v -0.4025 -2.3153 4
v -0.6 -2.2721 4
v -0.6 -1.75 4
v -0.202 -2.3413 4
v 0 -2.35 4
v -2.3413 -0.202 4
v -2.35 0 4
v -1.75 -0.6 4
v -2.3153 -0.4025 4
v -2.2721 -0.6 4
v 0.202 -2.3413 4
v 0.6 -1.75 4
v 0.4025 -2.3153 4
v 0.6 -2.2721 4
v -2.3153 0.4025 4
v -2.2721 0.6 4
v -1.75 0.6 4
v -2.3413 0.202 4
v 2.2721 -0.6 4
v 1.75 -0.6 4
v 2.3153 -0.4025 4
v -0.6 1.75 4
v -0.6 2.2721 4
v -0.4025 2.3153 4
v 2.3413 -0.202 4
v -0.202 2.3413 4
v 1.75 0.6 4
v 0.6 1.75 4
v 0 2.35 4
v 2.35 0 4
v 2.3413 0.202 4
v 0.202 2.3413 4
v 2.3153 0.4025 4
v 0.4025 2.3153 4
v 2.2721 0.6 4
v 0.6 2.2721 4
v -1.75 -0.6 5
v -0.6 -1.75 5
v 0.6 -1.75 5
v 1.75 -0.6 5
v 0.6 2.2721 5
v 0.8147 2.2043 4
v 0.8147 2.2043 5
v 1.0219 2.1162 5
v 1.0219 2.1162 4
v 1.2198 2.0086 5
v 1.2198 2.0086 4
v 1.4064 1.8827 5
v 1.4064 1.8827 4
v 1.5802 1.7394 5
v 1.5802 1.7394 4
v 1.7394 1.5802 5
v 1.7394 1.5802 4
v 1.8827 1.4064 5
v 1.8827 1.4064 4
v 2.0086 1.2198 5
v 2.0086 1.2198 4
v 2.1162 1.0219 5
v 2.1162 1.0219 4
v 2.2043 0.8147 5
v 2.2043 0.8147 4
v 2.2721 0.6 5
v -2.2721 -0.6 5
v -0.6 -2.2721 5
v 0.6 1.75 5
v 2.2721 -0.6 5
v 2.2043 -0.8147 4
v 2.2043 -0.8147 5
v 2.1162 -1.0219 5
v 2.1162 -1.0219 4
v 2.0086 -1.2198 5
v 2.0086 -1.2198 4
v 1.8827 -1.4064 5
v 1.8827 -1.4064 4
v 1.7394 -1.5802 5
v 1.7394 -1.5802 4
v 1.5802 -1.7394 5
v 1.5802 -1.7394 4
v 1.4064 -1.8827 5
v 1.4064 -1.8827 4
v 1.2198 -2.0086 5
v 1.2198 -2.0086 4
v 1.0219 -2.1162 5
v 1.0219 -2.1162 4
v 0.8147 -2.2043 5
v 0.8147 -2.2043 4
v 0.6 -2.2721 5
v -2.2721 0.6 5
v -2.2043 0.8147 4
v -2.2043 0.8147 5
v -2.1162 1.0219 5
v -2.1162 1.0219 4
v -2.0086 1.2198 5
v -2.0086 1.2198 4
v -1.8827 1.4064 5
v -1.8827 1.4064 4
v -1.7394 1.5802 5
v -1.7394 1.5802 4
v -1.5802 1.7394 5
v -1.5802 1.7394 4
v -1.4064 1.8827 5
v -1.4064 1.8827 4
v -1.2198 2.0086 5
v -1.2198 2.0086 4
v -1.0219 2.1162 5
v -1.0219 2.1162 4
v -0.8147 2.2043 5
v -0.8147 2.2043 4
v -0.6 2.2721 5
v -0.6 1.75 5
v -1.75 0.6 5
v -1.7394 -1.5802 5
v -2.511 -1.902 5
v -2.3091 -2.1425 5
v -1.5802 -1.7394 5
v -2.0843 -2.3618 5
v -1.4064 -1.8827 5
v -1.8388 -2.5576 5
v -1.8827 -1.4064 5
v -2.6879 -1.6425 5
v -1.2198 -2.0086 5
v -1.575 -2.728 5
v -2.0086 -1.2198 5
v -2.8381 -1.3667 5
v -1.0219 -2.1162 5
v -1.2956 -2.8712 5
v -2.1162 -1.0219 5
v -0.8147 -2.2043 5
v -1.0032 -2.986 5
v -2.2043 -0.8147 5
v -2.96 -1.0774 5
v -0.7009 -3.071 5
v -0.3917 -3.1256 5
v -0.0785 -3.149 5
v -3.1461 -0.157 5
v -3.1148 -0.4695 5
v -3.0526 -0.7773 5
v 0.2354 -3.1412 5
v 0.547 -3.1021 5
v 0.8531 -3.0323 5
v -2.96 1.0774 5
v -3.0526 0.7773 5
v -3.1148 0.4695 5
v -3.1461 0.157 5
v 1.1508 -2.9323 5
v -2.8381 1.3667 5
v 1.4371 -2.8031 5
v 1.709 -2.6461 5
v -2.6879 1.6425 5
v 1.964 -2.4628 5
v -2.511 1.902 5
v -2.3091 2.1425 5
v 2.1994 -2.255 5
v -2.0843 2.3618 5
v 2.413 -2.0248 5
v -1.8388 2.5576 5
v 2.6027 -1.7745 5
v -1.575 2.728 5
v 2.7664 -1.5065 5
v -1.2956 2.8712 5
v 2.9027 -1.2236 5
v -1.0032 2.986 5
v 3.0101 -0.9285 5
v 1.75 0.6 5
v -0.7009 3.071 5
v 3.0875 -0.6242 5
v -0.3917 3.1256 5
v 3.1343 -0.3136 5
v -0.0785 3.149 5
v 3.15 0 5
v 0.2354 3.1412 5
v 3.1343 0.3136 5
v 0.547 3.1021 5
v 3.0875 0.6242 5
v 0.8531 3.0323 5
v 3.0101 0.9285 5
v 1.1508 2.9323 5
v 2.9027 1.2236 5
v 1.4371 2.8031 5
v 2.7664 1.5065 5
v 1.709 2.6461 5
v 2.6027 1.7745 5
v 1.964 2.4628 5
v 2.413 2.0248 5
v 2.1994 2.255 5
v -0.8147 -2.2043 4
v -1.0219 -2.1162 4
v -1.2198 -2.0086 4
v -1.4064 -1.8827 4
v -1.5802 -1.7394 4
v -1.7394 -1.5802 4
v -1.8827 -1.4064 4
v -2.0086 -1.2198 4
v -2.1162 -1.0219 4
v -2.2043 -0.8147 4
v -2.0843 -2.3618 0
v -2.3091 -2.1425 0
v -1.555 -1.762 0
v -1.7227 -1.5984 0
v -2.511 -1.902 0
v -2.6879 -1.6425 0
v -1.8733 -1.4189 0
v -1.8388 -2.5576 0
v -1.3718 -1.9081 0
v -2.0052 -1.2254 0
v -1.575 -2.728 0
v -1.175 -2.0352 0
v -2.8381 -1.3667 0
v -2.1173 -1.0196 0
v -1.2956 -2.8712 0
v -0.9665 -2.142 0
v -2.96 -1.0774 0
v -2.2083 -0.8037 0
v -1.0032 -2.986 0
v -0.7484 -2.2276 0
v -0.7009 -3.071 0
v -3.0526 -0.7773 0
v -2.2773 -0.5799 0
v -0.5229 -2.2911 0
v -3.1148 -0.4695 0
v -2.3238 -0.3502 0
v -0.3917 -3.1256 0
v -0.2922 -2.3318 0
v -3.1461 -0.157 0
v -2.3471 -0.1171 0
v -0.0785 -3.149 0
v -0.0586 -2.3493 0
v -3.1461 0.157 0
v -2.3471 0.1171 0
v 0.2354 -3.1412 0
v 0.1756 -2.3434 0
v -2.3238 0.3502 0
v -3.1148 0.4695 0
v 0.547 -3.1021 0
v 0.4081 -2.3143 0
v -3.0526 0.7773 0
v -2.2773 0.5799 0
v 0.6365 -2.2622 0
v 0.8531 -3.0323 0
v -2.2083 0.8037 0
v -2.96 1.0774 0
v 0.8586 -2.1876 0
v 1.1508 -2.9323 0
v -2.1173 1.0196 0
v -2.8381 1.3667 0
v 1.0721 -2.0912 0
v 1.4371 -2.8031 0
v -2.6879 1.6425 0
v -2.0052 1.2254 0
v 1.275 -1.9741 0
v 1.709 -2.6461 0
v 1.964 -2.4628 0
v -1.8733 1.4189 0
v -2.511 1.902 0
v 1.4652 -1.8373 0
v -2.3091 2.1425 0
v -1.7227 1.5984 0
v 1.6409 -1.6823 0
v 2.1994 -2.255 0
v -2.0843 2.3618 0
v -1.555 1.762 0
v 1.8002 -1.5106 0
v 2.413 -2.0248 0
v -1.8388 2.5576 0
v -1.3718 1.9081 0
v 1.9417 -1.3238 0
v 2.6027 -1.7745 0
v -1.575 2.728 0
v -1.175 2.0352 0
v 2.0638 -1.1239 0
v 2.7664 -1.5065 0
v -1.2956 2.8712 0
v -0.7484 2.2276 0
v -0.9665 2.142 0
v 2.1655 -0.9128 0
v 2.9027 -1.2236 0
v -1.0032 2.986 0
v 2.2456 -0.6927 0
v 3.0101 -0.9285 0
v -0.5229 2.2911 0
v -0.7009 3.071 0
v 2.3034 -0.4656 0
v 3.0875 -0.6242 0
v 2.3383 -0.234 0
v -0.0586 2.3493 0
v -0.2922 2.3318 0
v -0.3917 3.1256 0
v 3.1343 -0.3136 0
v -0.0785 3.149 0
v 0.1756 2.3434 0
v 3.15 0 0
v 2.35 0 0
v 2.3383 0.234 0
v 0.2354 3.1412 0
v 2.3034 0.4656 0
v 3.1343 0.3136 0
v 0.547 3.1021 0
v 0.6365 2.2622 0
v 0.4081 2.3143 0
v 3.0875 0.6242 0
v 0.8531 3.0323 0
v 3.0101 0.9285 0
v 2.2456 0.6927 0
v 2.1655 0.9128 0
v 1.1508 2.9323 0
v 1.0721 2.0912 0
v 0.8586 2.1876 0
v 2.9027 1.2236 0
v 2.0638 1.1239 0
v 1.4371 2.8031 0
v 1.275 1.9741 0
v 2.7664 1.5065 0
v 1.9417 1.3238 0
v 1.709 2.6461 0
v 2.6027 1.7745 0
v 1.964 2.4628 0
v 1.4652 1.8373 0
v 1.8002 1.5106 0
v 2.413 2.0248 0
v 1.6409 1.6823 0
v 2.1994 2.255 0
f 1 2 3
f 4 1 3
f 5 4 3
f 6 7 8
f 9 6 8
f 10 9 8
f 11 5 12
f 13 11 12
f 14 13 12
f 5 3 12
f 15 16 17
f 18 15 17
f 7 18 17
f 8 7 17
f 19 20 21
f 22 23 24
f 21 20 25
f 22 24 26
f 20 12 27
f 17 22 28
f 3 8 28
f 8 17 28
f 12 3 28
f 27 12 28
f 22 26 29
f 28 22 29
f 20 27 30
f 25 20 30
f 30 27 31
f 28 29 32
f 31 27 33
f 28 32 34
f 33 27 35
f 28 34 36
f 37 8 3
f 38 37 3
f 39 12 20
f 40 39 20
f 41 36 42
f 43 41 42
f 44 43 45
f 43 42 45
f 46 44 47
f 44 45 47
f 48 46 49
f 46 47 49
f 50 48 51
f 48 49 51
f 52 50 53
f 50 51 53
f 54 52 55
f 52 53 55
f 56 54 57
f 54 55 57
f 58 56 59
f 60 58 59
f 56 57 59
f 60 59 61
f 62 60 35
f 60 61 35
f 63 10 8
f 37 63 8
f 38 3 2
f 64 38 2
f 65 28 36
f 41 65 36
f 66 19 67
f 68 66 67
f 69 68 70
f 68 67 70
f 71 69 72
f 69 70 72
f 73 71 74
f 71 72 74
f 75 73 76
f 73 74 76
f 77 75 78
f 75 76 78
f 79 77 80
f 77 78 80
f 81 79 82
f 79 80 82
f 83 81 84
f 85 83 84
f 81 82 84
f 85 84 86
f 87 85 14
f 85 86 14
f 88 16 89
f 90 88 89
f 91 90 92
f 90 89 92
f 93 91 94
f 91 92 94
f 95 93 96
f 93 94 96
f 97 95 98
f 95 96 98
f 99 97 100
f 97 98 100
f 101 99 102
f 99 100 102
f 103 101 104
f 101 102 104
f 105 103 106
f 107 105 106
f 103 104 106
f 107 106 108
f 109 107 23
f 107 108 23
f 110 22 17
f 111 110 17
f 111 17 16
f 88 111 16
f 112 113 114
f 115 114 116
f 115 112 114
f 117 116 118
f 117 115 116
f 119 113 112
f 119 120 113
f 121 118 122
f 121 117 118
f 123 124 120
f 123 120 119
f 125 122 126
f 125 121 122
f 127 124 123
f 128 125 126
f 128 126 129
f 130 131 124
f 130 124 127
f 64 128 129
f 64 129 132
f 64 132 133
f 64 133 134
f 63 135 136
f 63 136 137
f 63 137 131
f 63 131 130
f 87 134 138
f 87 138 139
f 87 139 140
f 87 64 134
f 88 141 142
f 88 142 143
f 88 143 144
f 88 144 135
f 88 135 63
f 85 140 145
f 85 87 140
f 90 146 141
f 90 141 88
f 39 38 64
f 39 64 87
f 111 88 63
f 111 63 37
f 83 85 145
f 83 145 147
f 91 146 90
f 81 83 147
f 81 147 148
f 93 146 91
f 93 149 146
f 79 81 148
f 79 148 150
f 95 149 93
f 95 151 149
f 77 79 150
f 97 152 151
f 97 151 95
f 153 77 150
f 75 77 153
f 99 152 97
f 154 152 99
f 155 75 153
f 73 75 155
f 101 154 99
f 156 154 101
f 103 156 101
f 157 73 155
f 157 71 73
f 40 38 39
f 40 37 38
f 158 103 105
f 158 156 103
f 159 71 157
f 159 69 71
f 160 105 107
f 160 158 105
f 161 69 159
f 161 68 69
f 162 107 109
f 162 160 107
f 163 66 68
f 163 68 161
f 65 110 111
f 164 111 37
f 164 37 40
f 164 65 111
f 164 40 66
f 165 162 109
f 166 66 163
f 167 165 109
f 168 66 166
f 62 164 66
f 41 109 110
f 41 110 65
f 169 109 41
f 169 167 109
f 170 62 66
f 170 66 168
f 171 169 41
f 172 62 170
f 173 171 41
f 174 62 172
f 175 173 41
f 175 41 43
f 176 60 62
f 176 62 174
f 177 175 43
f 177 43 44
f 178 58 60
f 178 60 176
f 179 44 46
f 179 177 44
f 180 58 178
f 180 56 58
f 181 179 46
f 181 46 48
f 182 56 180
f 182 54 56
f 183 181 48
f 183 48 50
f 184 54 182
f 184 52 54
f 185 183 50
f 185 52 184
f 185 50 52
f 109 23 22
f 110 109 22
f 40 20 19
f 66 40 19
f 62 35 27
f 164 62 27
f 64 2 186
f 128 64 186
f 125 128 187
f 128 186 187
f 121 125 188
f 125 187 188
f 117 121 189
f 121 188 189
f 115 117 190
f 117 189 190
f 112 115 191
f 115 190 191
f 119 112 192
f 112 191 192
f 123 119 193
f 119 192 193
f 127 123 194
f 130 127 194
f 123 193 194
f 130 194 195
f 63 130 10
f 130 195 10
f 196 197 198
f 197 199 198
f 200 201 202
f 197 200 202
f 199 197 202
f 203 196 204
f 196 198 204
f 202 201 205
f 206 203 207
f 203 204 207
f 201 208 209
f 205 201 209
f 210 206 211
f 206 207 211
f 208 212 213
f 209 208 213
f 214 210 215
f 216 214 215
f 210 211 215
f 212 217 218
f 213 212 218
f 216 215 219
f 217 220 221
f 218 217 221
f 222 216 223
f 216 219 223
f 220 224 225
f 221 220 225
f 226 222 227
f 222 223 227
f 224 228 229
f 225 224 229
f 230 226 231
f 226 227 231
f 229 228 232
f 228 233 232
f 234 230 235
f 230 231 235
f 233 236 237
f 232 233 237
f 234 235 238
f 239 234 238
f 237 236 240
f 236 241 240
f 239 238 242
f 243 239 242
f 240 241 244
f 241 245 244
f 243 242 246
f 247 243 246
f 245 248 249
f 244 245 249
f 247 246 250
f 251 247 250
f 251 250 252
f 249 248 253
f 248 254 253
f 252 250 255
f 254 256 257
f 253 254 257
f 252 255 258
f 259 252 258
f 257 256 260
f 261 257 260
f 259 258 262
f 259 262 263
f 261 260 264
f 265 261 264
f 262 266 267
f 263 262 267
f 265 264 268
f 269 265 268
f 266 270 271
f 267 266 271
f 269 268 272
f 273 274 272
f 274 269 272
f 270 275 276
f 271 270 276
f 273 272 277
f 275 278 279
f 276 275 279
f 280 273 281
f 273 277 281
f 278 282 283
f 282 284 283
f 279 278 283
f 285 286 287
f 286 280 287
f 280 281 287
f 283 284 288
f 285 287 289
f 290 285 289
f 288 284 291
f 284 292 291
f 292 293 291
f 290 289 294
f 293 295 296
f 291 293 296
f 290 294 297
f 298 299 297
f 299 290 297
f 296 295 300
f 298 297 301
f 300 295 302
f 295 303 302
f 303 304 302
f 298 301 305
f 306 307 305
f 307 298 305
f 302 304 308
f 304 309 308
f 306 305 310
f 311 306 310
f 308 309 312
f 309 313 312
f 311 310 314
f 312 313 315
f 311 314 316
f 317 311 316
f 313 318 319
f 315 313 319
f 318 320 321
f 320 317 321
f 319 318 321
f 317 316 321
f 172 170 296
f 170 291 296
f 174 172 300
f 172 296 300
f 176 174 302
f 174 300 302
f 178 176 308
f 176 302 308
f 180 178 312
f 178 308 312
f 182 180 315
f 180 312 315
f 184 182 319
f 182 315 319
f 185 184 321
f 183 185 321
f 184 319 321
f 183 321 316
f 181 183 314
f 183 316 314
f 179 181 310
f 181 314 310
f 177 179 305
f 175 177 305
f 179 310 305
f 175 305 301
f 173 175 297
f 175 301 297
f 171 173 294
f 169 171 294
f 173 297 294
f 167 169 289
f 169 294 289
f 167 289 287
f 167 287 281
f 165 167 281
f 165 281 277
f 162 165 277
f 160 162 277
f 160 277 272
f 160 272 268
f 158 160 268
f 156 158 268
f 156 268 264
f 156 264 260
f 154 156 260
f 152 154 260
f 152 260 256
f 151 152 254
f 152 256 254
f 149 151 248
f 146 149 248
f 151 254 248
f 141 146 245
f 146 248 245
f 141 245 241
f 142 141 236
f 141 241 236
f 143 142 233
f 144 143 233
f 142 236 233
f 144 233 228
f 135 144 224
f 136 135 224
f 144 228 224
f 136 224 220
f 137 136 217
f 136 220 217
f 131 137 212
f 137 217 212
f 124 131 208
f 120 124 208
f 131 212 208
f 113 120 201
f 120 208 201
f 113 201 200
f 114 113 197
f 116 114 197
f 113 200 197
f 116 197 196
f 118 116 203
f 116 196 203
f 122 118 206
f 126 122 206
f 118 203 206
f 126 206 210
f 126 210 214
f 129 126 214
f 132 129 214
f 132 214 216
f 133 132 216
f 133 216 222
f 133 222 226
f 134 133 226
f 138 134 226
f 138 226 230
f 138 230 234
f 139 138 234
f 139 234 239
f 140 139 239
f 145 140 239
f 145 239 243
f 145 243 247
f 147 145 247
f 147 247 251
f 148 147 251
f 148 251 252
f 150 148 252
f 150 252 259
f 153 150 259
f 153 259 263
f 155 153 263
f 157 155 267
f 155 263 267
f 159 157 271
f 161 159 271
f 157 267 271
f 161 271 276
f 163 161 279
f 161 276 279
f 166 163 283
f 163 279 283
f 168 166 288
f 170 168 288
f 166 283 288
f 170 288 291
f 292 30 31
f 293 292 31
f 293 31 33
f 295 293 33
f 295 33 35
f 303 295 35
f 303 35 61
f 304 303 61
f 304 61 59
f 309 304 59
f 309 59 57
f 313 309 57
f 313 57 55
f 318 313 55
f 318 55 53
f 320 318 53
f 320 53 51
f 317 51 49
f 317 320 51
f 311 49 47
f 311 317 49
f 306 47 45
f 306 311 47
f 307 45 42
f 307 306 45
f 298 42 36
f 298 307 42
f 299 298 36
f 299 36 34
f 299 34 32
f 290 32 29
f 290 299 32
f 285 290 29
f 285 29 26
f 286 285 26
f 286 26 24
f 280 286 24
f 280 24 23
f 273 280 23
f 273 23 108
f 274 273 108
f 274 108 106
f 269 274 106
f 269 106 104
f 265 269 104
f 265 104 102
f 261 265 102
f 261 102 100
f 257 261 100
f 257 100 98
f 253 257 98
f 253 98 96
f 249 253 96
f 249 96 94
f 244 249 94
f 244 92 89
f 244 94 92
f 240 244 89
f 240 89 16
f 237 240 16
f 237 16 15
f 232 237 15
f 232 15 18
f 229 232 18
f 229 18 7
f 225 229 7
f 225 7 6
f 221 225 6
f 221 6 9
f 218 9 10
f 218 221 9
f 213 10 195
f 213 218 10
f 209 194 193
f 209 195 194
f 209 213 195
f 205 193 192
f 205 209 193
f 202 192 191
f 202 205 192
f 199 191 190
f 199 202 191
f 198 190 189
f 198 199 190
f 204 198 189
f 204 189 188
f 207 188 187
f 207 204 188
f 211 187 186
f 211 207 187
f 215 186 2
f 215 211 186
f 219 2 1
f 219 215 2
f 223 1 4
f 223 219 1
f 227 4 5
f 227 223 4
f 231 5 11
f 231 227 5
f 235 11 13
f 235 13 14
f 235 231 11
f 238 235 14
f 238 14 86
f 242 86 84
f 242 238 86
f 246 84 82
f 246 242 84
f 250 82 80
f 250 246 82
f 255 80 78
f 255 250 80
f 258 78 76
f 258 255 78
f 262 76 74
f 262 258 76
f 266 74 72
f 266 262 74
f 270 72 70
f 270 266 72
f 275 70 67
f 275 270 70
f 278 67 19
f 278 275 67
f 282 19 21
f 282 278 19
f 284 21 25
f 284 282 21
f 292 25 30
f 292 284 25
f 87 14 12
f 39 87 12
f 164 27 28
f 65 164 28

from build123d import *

# Parameters (mm, degrees)
F0_R     = 3.15
F0_R_2   = 2.35
F1_DEPTH = 4
F2_R     = 3.15
F3_DEPTH = 1


# Not quite as in the source:
# - after a boolean that leaves OpenCascade's solid faulty, fix() repairs it


with BuildPart() as f1:
    # F0 (on Top) → F1 (new body)
    with BuildSketch(Plane.XY):
        Circle(F0_R)
        Circle(F0_R_2, mode=Mode.SUBTRACT)
    extrude(amount=F1_DEPTH)

    # F2 (on face) → F3 (join)
    with BuildSketch(Plane.XY.offset(4)):
        Circle(F2_R)
        with BuildLine():
            ThreePointArc((-2.2721135535, 0.6), (-1.6617009358, 1.6617009358), (-0.6, 2.2721135535))
            ThreePointArc((-0.6, 2.2721135535), (0, 2.35), (0.6, 2.2721135535))
            ThreePointArc((0.6, 2.2721135535), (1.6617009358, 1.6617009358), (2.2721135535, 0.6))
            ThreePointArc((2.2721135535, 0.6), (2.3304470441, 0.302517065), (2.35, 0))
            ThreePointArc((2.35, 0), (2.3304470441, -0.302517065), (2.2721135535, -0.6))
            ThreePointArc((2.2721135535, -0.6), (1.6617009358, -1.6617009358), (0.6, -2.2721135535))
            ThreePointArc((0.6, -2.2721135535), (0, -2.35), (-0.6, -2.2721135535))
            ThreePointArc((-0.6, -2.2721135535), (-1.6617009358, -1.6617009358), (-2.2721135535, -0.6))
            ThreePointArc((-2.2721135535, -0.6), (-2.35, 0), (-2.2721135535, 0.6))
        make_face(mode=Mode.SUBTRACT)
        with BuildLine():
            ThreePointArc((0.6, 2.2721135535), (0, 2.35), (-0.6, 2.2721135535))
            Line((-0.6, 2.2721135535), (-0.6, 1.75))
            Line((-0.6, 1.75), (-1.75, 0.6))
            Line((-1.75, 0.6), (-2.2721135535, 0.6))
            ThreePointArc((-2.2721135535, 0.6), (-2.35, 0), (-2.2721135535, -0.6))
            Line((-2.2721135535, -0.6), (-1.75, -0.6))
            Line((-1.75, -0.6), (-0.6, -1.75))
            Line((-0.6, -1.75), (-0.6, -2.2721135535))
            ThreePointArc((-0.6, -2.2721135535), (0, -2.35), (0.6, -2.2721135535))
            Line((0.6, -2.2721135535), (0.6, -1.75))
            Line((0.6, -1.75), (1.75, -0.6))
            Line((1.75, -0.6), (2.2721135535, -0.6))
            ThreePointArc((2.2721135535, -0.6), (2.3304470441, -0.302517065), (2.35, 0))
            ThreePointArc((2.35, 0), (2.3304470441, 0.302517065), (2.2721135535, 0.6))
            Line((2.2721135535, 0.6), (1.75, 0.6))
            Line((1.75, 0.6), (0.6, 1.75))
            Line((0.6, 1.75), (0.6, 2.2721135535))
        make_face()
    extrude(amount=F3_DEPTH)

    add(f1.part.fix(), mode=Mode.REPLACE)


solid = f1.part
